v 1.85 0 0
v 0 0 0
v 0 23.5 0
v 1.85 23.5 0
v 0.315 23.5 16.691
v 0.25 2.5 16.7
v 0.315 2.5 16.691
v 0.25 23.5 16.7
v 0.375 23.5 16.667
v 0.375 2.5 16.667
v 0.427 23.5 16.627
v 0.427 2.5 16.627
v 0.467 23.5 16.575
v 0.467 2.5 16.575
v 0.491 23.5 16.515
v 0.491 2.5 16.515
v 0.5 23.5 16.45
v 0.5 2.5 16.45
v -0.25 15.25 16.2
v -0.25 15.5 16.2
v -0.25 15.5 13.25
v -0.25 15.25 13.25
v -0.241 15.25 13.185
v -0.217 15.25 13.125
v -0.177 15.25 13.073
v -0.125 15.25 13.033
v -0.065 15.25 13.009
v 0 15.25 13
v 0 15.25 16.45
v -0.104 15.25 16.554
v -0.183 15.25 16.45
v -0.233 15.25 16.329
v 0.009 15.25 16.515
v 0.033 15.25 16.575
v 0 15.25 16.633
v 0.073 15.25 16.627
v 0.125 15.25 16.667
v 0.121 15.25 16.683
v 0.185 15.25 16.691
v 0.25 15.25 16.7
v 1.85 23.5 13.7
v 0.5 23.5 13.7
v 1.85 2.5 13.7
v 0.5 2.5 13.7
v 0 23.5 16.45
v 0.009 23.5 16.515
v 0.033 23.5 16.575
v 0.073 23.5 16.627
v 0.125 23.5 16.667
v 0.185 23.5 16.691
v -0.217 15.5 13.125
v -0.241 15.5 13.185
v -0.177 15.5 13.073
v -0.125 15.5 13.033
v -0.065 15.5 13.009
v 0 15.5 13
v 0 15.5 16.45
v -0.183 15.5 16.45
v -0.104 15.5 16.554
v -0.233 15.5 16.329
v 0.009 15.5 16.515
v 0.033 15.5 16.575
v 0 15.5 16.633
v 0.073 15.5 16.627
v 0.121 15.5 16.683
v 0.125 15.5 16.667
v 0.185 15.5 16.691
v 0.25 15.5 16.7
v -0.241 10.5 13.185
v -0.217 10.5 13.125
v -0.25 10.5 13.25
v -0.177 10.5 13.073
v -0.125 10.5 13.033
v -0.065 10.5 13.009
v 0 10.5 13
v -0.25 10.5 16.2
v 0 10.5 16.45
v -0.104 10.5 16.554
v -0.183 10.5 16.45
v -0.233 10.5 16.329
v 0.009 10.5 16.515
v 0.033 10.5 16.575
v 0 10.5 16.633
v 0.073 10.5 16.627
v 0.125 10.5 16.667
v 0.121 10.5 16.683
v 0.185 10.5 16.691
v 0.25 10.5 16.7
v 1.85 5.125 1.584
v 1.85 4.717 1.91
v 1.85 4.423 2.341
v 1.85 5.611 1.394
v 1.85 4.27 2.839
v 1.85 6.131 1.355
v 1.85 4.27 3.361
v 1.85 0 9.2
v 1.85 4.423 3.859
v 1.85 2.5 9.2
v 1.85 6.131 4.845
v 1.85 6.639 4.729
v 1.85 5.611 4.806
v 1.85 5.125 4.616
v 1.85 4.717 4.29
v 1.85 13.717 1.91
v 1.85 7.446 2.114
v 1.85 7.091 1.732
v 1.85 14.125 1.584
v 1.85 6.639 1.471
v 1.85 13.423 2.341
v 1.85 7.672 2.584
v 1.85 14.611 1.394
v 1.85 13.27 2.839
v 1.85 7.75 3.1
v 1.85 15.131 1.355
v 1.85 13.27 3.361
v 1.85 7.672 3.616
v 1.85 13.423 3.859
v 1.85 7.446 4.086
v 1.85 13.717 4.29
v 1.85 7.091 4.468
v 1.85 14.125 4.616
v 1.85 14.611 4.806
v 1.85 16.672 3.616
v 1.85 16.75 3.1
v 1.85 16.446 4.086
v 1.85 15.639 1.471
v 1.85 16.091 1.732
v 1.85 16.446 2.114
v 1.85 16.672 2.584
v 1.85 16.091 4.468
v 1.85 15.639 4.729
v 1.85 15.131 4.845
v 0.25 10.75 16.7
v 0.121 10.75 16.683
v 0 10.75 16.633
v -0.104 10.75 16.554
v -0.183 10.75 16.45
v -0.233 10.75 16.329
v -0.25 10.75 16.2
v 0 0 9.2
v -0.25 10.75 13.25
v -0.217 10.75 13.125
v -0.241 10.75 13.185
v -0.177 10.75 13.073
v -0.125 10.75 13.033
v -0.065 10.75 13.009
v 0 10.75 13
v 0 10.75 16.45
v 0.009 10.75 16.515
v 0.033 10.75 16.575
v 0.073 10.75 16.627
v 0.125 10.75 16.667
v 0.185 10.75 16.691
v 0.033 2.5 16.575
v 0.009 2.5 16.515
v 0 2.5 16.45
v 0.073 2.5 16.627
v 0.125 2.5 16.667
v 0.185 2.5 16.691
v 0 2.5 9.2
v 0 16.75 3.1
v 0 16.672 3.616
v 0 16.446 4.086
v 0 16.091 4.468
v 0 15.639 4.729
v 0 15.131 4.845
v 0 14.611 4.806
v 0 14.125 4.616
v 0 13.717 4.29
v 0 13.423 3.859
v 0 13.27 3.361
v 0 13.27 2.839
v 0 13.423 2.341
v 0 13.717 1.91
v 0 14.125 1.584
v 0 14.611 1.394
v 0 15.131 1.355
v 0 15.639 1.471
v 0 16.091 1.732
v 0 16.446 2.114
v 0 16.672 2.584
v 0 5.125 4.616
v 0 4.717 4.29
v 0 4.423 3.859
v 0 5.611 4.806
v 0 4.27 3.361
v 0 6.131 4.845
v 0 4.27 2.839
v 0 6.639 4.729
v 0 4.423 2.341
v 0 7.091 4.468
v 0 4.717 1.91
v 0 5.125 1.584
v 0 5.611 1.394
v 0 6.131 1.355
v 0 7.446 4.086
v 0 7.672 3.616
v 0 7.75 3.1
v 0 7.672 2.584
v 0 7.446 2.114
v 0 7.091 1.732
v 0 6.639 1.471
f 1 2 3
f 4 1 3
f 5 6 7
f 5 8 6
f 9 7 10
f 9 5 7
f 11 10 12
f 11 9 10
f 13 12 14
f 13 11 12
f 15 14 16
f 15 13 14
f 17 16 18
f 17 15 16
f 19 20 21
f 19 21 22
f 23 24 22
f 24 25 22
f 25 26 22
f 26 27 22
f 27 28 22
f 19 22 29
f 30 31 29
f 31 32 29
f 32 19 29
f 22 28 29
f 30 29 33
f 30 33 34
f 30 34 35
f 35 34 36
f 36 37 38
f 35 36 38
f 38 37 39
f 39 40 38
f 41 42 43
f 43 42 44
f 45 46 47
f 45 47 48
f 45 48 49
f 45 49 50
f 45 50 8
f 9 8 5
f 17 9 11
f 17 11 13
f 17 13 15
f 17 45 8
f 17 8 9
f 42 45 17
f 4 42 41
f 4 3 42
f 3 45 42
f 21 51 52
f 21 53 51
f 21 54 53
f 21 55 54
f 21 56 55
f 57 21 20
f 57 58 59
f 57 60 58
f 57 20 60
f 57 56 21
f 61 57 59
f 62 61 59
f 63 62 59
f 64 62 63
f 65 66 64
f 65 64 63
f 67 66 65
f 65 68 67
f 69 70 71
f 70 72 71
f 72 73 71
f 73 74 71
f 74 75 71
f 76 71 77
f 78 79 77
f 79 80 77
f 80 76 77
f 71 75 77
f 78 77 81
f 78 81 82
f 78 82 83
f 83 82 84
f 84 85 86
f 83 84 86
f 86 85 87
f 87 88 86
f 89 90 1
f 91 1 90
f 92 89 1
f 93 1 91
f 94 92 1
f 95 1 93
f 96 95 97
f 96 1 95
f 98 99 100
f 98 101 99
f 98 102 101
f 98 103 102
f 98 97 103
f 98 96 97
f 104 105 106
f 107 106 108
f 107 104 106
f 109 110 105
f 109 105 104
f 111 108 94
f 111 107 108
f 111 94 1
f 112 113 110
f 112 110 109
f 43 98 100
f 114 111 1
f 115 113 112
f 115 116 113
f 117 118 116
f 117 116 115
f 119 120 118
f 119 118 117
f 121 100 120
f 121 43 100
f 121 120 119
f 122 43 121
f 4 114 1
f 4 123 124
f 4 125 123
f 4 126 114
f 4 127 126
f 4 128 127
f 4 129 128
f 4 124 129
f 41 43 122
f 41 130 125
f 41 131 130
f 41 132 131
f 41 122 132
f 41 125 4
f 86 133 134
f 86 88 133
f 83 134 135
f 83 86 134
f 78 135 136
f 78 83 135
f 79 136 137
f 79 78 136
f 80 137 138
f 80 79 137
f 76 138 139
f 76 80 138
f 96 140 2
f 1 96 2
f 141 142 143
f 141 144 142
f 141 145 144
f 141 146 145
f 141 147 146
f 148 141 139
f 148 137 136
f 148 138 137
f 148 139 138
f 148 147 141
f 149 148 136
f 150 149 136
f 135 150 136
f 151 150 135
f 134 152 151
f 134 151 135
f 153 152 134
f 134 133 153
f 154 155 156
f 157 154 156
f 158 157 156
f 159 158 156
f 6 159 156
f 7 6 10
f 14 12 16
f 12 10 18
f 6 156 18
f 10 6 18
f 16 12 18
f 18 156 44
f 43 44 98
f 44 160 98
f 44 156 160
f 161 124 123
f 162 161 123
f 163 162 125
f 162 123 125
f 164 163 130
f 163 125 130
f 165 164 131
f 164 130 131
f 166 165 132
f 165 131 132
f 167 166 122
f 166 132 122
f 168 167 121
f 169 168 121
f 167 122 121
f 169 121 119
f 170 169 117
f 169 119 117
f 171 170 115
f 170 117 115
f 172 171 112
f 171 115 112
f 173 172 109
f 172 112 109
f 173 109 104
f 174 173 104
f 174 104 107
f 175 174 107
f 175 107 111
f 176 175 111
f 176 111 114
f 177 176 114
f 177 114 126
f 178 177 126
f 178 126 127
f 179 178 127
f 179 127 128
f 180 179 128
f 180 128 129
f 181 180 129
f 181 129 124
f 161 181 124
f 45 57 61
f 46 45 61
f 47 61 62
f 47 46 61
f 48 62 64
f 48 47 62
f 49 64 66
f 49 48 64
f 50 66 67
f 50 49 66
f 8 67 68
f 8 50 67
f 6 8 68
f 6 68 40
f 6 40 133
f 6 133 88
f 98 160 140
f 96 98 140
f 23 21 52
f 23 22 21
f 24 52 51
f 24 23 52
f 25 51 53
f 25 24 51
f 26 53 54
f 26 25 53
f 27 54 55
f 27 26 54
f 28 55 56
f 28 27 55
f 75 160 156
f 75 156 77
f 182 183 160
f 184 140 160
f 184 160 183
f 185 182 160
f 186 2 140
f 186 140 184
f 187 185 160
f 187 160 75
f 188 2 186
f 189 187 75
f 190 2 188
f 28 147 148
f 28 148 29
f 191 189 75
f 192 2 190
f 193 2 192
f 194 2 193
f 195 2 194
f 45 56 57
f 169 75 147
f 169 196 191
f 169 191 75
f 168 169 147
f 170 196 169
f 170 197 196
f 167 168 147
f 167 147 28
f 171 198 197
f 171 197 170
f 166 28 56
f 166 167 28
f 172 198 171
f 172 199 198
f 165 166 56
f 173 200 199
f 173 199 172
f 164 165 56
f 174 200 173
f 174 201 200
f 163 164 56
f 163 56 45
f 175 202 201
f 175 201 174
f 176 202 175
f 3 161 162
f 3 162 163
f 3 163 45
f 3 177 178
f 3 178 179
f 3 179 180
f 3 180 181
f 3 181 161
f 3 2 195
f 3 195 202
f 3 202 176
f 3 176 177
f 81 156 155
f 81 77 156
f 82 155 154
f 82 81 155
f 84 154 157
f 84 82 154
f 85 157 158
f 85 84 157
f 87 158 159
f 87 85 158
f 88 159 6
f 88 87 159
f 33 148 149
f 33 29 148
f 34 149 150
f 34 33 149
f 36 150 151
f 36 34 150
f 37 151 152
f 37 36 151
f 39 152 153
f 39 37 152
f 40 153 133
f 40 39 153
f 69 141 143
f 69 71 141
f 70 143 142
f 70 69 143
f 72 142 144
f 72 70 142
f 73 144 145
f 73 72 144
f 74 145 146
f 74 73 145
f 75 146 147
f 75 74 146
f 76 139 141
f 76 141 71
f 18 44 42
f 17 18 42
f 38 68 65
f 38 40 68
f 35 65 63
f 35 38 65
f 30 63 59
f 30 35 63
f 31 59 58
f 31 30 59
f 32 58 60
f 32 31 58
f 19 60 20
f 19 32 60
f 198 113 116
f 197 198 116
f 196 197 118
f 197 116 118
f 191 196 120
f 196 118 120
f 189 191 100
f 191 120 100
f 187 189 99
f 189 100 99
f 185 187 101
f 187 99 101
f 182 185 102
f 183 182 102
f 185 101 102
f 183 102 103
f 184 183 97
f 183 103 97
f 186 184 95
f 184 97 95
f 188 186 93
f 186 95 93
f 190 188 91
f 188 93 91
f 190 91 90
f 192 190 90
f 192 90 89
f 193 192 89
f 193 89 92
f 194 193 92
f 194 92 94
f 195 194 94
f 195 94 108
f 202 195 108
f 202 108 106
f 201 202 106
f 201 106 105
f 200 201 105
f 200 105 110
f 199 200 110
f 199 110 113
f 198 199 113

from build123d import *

# Parameters (mm, degrees)
F1_DEPTH = 1.85
F2_W     = 0.5
F2_H     = 21
F3_DEPTH = 3
F4_R     = 1.75
F5_DEPTH = 1.851
F6_W     = 0.25
F6_H     = 3.7
F7_DEPTH = 0.25
F8_R     = 0.24999
F9_R     = 0.4999
F10_R    = 0.24999


# Not quite as in the source:
# - a fillet or chamfer is up to 0.001 mm smaller than in the source, because OpenCascade refuses the exact size


with BuildPart() as f1:
    # F0 (on Right) → F1 (new body)
    with BuildSketch(Plane.YZ):
        Polygon((0, 9.2), (0, 0), (23.5, 0), (23.5, 13.7), (2.5, 13.7), (2.5, 9.2), align=None)
    extrude(amount=F1_DEPTH)

    # F2 (on face) → F3 (join)
    with BuildSketch(Plane.XY.offset(13.7)):
        with Locations((0.25, 13)):
            Rectangle(F2_W, F2_H)
    extrude(amount=F3_DEPTH)

    # F4 (on face) → F5 (cut, through all)
    with BuildSketch(Plane.YZ.offset(1.85)):
        with Locations((6, 3.1)):
            Circle(F4_R)
        with Locations((15, 3.1)):
            Circle(F4_R)
    extrude(amount=-F5_DEPTH, mode=Mode.SUBTRACT)

    # F6 (on face) → F7 (join)
    with BuildSketch(Plane(origin=(0, 0, 0), x_dir=(0, -1, 0), z_dir=(-1, 0, 0))):
        with Locations((-15.375, 14.85)):
            Rectangle(F6_W, F6_H)
        with Locations((-10.625, 14.85)):
            Rectangle(F6_W, F6_H)
    extrude(amount=F7_DEPTH)

    # F8 (radius 0.25 in the source; OpenCascade refuses exactly that, so slightly less here)
    f8_edges = [f1.edges().sort_by_distance(p)[0] for p in [
        (0, 6.5, 16.7),
        (0, 13, 16.7),
        (0, 19.5, 16.7),
        (0.5, 13, 16.7),
    ]]
    fillet(f8_edges, radius=F8_R)

    # F9 (radius 0.5 in the source; OpenCascade refuses exactly that, so slightly less here)
    f9_edges = [f1.edges().sort_by_distance(p)[0] for p in [
        (-0.25, 15.375, 16.7),
        (-0.25, 10.625, 16.7),
    ]]
    fillet(f9_edges, radius=F9_R)

    # F10 (radius 0.25 in the source; OpenCascade refuses exactly that, so slightly less here)
    f10_edges = [f1.edges().sort_by_distance(p)[0] for p in [
        (-0.25, 10.625, 13),
        (-0.25, 15.375, 13),
    ]]
    fillet(f10_edges, radius=F10_R)


solid = f1.part
